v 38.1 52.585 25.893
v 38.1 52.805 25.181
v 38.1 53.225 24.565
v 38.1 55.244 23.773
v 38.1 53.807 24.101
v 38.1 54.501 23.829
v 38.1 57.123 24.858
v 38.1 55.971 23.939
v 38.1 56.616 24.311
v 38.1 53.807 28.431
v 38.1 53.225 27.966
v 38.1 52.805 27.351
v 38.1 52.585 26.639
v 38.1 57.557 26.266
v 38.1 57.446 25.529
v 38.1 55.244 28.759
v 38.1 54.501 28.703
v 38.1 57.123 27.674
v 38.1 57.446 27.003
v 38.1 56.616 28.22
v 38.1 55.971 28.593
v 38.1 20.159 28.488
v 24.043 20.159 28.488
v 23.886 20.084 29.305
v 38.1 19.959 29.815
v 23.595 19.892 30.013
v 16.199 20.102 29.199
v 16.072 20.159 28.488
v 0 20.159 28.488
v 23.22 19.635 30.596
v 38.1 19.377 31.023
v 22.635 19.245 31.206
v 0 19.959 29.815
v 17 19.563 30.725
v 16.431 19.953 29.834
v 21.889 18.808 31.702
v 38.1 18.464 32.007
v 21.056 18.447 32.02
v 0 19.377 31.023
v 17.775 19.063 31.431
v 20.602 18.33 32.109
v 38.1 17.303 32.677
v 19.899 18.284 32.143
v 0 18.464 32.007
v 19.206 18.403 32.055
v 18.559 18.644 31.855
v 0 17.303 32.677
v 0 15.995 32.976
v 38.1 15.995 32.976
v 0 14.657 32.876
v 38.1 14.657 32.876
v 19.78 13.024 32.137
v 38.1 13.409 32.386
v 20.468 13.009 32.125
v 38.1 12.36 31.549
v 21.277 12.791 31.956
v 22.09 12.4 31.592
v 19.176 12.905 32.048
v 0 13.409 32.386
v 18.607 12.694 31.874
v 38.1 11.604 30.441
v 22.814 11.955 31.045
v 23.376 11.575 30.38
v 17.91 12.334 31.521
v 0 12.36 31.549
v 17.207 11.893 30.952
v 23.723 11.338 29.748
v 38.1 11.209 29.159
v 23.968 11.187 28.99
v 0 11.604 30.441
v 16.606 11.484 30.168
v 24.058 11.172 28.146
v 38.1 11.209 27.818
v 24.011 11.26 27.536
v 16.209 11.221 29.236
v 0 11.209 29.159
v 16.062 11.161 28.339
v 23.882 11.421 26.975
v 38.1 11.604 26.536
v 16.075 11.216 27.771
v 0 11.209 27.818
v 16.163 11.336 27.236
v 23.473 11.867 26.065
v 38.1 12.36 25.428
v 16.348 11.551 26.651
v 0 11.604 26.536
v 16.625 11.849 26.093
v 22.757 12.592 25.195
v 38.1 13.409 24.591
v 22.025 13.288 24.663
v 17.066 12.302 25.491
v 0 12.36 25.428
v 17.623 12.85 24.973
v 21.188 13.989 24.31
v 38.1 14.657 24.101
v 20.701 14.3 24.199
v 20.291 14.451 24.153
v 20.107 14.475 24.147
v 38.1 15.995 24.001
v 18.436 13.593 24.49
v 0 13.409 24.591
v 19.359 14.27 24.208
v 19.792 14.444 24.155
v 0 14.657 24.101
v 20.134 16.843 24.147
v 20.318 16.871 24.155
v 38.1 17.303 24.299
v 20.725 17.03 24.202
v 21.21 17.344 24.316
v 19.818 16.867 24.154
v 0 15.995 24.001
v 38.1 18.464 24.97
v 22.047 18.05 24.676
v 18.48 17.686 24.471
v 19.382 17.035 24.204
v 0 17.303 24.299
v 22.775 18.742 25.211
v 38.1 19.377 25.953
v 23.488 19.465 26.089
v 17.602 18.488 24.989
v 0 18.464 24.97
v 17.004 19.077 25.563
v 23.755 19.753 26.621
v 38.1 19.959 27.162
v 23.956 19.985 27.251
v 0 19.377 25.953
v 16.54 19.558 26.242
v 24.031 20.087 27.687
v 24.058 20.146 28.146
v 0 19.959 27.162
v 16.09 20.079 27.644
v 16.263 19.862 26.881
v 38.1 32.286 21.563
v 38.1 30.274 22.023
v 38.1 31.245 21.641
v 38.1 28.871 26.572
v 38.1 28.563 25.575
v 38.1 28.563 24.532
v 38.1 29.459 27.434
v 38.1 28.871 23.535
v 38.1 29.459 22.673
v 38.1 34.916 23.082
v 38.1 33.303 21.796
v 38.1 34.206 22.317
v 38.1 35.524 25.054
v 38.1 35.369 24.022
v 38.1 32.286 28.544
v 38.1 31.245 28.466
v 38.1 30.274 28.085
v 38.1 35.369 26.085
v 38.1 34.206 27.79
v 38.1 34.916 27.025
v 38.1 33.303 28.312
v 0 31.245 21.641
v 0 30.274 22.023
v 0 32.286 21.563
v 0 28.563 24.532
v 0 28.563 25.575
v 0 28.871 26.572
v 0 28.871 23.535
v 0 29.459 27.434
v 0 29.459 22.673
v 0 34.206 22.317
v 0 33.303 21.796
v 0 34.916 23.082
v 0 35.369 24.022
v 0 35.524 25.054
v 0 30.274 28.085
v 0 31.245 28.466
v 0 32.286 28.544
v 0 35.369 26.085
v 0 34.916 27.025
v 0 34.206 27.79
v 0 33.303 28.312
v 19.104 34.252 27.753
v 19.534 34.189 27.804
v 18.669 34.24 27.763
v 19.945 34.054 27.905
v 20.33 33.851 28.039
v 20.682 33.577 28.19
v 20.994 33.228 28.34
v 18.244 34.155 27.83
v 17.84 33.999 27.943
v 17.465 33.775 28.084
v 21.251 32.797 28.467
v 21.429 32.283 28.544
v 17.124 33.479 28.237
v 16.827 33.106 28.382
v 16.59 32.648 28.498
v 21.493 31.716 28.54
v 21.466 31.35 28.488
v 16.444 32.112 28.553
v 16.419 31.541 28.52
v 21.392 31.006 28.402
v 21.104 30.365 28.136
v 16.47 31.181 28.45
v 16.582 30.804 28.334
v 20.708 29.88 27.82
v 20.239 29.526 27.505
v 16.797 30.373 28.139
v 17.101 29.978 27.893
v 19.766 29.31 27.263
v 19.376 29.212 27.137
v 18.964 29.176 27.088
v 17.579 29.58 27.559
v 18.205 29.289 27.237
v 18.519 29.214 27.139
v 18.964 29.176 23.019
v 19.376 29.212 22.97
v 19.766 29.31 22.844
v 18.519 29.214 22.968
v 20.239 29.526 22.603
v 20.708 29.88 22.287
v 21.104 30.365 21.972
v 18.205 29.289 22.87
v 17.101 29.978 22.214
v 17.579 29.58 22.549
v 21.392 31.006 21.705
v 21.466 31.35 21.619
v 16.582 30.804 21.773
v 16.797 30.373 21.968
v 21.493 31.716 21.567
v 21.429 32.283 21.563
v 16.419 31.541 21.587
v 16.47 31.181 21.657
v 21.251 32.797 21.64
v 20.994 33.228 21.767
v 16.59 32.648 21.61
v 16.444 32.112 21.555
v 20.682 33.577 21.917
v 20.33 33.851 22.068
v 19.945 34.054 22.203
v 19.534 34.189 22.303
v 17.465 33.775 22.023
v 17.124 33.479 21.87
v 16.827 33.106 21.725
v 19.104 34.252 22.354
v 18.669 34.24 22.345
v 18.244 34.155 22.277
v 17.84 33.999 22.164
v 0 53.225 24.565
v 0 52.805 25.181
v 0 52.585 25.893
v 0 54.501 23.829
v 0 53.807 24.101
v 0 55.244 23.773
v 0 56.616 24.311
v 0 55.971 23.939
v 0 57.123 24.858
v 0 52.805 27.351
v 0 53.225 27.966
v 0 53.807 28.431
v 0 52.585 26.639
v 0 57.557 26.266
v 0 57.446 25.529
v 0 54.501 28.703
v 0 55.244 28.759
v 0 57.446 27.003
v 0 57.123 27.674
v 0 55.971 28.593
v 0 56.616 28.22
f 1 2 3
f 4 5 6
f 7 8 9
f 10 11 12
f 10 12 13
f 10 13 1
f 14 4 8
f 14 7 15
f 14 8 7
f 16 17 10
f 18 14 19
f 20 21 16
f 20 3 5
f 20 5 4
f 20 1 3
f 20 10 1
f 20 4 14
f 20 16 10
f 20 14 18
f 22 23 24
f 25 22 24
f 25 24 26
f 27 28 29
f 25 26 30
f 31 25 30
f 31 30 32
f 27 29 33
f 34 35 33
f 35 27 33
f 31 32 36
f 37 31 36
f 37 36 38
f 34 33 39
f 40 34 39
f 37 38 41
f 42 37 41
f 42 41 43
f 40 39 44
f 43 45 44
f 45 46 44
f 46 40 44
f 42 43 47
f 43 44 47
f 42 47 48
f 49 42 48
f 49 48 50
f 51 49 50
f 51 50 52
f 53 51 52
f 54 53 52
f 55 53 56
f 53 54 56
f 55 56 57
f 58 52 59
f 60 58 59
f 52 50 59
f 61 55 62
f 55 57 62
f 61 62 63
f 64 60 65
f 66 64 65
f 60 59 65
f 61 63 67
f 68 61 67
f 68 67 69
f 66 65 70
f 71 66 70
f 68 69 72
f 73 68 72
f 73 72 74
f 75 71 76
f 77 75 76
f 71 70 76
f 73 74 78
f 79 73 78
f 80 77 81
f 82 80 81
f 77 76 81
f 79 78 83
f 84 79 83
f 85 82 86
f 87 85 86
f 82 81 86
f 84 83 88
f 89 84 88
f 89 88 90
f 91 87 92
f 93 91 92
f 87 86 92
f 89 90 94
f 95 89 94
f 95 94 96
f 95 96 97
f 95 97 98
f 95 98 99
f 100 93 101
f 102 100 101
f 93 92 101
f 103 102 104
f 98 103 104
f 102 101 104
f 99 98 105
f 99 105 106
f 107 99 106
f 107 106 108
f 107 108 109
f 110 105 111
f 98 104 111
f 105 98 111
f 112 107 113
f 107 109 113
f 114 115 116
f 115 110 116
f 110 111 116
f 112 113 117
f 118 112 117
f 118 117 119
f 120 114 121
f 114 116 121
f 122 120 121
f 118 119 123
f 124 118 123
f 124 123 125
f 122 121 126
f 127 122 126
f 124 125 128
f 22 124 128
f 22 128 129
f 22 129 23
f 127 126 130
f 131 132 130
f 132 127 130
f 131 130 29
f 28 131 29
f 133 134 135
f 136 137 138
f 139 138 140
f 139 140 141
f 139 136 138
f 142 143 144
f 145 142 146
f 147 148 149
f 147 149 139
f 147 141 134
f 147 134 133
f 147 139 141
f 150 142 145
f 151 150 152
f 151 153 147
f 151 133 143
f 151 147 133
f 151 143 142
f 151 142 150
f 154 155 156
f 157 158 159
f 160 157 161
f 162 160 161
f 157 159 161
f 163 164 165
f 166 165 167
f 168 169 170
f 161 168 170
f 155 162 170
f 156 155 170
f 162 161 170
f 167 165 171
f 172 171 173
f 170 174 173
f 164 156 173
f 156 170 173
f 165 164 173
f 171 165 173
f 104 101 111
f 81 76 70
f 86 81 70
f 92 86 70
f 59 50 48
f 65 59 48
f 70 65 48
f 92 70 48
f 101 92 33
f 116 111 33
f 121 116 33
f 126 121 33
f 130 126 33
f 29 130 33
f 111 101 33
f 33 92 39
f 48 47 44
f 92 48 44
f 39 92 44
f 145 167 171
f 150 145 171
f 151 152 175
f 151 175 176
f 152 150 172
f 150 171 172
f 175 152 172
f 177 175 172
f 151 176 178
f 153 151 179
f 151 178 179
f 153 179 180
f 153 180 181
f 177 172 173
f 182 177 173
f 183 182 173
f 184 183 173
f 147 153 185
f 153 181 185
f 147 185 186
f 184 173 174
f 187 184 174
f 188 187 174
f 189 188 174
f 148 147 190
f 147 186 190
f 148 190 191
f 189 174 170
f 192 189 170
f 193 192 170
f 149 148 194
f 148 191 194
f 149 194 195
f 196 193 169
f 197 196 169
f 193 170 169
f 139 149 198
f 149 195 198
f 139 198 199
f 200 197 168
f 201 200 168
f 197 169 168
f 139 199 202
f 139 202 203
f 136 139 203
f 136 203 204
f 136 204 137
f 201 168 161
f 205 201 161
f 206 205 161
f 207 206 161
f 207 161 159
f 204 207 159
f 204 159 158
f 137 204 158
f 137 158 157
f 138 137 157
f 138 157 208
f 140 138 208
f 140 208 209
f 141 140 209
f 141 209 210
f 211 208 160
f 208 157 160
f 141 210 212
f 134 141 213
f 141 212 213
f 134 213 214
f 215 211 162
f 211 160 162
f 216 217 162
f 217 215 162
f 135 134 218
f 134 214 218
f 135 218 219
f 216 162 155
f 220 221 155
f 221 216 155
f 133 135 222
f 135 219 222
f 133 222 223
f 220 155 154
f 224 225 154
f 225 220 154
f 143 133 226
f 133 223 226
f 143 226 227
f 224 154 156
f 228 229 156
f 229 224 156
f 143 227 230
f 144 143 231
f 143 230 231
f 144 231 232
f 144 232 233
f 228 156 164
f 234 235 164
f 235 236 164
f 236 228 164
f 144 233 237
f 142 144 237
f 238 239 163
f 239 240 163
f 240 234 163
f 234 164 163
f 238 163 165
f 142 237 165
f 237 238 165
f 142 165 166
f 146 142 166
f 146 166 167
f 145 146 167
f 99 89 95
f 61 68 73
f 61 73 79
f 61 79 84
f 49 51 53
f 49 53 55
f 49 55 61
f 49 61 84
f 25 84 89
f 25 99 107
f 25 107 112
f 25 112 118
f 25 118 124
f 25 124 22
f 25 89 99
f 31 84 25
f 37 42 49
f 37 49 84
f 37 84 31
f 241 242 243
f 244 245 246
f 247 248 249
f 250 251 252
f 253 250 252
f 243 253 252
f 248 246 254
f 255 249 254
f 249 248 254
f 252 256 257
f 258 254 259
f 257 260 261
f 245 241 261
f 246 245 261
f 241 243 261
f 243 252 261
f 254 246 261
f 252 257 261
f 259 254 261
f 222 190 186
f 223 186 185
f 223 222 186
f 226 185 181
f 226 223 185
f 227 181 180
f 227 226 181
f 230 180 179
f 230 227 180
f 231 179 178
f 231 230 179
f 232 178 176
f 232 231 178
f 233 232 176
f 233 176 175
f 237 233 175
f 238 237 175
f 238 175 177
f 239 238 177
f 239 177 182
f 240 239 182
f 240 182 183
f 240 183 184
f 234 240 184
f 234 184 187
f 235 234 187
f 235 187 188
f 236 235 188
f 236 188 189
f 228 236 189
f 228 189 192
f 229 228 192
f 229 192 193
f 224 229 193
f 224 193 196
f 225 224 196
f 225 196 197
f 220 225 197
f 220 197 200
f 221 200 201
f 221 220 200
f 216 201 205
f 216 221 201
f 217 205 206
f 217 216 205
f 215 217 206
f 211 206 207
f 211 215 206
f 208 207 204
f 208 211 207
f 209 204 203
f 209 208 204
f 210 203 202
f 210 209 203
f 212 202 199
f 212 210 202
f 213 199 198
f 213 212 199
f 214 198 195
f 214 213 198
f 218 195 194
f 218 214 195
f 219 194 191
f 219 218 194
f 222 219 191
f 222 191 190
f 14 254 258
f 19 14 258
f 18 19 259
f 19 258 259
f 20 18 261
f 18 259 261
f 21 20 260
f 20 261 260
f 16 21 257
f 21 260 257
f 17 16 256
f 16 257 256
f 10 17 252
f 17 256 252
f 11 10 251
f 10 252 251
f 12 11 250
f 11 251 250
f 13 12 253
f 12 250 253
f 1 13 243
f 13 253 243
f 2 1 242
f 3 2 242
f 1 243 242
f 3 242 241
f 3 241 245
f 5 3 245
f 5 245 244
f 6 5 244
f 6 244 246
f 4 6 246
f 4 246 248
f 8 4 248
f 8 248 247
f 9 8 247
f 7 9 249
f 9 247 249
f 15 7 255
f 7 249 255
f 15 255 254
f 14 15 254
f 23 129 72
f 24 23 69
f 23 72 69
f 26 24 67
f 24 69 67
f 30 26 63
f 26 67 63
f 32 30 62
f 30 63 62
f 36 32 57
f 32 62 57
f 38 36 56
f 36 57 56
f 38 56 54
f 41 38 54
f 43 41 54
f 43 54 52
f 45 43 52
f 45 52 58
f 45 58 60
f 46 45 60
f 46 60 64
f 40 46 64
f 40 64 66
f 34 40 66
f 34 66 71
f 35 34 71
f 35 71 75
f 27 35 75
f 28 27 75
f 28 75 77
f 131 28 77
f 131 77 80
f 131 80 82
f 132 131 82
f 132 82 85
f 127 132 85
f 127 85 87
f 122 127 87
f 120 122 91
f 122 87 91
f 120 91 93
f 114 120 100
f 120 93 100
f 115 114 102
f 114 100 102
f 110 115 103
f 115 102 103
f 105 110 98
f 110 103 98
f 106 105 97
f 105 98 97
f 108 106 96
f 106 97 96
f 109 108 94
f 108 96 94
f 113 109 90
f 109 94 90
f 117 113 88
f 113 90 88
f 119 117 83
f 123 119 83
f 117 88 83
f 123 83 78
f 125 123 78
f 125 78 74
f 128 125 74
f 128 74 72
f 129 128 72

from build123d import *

# Parameters (mm, degrees)
F0_R     = 3.5
F0_R_2   = 2.5
F0_R_3   = 4.5
F1_DEPTH = 38.1
F2_R     = 4
F3_DEPTH = 24.765
F4_R     = 2.54
F5_DEPTH = 32.989409


with BuildPart() as f1:
    # F0 (on Right) → F1 (new body)
    with BuildSketch(Plane.YZ):
        with Locations((32.024205, 25.053635)):
            Circle(F0_R)
        with Locations((55.057388, 26.26591)):
            Circle(F0_R_2)
        with Locations((15.658524, 28.488409)):
            Circle(F0_R_3)
    extrude(amount=F1_DEPTH)

    # F2 (on Front) → F3 (cut)
    with BuildSketch(Plane.XZ):
        with Locations((20.057798, 28.146493)):
            Circle(F2_R)
    extrude(amount=-F3_DEPTH, mode=Mode.SUBTRACT)

    # F4 (on Top) → F5 (cut, through all)
    with BuildSketch(Plane.XY):
        with Locations((18.952941, 31.71625)):
            Circle(F4_R)
    extrude(amount=F5_DEPTH, mode=Mode.SUBTRACT)


solid = f1.part
